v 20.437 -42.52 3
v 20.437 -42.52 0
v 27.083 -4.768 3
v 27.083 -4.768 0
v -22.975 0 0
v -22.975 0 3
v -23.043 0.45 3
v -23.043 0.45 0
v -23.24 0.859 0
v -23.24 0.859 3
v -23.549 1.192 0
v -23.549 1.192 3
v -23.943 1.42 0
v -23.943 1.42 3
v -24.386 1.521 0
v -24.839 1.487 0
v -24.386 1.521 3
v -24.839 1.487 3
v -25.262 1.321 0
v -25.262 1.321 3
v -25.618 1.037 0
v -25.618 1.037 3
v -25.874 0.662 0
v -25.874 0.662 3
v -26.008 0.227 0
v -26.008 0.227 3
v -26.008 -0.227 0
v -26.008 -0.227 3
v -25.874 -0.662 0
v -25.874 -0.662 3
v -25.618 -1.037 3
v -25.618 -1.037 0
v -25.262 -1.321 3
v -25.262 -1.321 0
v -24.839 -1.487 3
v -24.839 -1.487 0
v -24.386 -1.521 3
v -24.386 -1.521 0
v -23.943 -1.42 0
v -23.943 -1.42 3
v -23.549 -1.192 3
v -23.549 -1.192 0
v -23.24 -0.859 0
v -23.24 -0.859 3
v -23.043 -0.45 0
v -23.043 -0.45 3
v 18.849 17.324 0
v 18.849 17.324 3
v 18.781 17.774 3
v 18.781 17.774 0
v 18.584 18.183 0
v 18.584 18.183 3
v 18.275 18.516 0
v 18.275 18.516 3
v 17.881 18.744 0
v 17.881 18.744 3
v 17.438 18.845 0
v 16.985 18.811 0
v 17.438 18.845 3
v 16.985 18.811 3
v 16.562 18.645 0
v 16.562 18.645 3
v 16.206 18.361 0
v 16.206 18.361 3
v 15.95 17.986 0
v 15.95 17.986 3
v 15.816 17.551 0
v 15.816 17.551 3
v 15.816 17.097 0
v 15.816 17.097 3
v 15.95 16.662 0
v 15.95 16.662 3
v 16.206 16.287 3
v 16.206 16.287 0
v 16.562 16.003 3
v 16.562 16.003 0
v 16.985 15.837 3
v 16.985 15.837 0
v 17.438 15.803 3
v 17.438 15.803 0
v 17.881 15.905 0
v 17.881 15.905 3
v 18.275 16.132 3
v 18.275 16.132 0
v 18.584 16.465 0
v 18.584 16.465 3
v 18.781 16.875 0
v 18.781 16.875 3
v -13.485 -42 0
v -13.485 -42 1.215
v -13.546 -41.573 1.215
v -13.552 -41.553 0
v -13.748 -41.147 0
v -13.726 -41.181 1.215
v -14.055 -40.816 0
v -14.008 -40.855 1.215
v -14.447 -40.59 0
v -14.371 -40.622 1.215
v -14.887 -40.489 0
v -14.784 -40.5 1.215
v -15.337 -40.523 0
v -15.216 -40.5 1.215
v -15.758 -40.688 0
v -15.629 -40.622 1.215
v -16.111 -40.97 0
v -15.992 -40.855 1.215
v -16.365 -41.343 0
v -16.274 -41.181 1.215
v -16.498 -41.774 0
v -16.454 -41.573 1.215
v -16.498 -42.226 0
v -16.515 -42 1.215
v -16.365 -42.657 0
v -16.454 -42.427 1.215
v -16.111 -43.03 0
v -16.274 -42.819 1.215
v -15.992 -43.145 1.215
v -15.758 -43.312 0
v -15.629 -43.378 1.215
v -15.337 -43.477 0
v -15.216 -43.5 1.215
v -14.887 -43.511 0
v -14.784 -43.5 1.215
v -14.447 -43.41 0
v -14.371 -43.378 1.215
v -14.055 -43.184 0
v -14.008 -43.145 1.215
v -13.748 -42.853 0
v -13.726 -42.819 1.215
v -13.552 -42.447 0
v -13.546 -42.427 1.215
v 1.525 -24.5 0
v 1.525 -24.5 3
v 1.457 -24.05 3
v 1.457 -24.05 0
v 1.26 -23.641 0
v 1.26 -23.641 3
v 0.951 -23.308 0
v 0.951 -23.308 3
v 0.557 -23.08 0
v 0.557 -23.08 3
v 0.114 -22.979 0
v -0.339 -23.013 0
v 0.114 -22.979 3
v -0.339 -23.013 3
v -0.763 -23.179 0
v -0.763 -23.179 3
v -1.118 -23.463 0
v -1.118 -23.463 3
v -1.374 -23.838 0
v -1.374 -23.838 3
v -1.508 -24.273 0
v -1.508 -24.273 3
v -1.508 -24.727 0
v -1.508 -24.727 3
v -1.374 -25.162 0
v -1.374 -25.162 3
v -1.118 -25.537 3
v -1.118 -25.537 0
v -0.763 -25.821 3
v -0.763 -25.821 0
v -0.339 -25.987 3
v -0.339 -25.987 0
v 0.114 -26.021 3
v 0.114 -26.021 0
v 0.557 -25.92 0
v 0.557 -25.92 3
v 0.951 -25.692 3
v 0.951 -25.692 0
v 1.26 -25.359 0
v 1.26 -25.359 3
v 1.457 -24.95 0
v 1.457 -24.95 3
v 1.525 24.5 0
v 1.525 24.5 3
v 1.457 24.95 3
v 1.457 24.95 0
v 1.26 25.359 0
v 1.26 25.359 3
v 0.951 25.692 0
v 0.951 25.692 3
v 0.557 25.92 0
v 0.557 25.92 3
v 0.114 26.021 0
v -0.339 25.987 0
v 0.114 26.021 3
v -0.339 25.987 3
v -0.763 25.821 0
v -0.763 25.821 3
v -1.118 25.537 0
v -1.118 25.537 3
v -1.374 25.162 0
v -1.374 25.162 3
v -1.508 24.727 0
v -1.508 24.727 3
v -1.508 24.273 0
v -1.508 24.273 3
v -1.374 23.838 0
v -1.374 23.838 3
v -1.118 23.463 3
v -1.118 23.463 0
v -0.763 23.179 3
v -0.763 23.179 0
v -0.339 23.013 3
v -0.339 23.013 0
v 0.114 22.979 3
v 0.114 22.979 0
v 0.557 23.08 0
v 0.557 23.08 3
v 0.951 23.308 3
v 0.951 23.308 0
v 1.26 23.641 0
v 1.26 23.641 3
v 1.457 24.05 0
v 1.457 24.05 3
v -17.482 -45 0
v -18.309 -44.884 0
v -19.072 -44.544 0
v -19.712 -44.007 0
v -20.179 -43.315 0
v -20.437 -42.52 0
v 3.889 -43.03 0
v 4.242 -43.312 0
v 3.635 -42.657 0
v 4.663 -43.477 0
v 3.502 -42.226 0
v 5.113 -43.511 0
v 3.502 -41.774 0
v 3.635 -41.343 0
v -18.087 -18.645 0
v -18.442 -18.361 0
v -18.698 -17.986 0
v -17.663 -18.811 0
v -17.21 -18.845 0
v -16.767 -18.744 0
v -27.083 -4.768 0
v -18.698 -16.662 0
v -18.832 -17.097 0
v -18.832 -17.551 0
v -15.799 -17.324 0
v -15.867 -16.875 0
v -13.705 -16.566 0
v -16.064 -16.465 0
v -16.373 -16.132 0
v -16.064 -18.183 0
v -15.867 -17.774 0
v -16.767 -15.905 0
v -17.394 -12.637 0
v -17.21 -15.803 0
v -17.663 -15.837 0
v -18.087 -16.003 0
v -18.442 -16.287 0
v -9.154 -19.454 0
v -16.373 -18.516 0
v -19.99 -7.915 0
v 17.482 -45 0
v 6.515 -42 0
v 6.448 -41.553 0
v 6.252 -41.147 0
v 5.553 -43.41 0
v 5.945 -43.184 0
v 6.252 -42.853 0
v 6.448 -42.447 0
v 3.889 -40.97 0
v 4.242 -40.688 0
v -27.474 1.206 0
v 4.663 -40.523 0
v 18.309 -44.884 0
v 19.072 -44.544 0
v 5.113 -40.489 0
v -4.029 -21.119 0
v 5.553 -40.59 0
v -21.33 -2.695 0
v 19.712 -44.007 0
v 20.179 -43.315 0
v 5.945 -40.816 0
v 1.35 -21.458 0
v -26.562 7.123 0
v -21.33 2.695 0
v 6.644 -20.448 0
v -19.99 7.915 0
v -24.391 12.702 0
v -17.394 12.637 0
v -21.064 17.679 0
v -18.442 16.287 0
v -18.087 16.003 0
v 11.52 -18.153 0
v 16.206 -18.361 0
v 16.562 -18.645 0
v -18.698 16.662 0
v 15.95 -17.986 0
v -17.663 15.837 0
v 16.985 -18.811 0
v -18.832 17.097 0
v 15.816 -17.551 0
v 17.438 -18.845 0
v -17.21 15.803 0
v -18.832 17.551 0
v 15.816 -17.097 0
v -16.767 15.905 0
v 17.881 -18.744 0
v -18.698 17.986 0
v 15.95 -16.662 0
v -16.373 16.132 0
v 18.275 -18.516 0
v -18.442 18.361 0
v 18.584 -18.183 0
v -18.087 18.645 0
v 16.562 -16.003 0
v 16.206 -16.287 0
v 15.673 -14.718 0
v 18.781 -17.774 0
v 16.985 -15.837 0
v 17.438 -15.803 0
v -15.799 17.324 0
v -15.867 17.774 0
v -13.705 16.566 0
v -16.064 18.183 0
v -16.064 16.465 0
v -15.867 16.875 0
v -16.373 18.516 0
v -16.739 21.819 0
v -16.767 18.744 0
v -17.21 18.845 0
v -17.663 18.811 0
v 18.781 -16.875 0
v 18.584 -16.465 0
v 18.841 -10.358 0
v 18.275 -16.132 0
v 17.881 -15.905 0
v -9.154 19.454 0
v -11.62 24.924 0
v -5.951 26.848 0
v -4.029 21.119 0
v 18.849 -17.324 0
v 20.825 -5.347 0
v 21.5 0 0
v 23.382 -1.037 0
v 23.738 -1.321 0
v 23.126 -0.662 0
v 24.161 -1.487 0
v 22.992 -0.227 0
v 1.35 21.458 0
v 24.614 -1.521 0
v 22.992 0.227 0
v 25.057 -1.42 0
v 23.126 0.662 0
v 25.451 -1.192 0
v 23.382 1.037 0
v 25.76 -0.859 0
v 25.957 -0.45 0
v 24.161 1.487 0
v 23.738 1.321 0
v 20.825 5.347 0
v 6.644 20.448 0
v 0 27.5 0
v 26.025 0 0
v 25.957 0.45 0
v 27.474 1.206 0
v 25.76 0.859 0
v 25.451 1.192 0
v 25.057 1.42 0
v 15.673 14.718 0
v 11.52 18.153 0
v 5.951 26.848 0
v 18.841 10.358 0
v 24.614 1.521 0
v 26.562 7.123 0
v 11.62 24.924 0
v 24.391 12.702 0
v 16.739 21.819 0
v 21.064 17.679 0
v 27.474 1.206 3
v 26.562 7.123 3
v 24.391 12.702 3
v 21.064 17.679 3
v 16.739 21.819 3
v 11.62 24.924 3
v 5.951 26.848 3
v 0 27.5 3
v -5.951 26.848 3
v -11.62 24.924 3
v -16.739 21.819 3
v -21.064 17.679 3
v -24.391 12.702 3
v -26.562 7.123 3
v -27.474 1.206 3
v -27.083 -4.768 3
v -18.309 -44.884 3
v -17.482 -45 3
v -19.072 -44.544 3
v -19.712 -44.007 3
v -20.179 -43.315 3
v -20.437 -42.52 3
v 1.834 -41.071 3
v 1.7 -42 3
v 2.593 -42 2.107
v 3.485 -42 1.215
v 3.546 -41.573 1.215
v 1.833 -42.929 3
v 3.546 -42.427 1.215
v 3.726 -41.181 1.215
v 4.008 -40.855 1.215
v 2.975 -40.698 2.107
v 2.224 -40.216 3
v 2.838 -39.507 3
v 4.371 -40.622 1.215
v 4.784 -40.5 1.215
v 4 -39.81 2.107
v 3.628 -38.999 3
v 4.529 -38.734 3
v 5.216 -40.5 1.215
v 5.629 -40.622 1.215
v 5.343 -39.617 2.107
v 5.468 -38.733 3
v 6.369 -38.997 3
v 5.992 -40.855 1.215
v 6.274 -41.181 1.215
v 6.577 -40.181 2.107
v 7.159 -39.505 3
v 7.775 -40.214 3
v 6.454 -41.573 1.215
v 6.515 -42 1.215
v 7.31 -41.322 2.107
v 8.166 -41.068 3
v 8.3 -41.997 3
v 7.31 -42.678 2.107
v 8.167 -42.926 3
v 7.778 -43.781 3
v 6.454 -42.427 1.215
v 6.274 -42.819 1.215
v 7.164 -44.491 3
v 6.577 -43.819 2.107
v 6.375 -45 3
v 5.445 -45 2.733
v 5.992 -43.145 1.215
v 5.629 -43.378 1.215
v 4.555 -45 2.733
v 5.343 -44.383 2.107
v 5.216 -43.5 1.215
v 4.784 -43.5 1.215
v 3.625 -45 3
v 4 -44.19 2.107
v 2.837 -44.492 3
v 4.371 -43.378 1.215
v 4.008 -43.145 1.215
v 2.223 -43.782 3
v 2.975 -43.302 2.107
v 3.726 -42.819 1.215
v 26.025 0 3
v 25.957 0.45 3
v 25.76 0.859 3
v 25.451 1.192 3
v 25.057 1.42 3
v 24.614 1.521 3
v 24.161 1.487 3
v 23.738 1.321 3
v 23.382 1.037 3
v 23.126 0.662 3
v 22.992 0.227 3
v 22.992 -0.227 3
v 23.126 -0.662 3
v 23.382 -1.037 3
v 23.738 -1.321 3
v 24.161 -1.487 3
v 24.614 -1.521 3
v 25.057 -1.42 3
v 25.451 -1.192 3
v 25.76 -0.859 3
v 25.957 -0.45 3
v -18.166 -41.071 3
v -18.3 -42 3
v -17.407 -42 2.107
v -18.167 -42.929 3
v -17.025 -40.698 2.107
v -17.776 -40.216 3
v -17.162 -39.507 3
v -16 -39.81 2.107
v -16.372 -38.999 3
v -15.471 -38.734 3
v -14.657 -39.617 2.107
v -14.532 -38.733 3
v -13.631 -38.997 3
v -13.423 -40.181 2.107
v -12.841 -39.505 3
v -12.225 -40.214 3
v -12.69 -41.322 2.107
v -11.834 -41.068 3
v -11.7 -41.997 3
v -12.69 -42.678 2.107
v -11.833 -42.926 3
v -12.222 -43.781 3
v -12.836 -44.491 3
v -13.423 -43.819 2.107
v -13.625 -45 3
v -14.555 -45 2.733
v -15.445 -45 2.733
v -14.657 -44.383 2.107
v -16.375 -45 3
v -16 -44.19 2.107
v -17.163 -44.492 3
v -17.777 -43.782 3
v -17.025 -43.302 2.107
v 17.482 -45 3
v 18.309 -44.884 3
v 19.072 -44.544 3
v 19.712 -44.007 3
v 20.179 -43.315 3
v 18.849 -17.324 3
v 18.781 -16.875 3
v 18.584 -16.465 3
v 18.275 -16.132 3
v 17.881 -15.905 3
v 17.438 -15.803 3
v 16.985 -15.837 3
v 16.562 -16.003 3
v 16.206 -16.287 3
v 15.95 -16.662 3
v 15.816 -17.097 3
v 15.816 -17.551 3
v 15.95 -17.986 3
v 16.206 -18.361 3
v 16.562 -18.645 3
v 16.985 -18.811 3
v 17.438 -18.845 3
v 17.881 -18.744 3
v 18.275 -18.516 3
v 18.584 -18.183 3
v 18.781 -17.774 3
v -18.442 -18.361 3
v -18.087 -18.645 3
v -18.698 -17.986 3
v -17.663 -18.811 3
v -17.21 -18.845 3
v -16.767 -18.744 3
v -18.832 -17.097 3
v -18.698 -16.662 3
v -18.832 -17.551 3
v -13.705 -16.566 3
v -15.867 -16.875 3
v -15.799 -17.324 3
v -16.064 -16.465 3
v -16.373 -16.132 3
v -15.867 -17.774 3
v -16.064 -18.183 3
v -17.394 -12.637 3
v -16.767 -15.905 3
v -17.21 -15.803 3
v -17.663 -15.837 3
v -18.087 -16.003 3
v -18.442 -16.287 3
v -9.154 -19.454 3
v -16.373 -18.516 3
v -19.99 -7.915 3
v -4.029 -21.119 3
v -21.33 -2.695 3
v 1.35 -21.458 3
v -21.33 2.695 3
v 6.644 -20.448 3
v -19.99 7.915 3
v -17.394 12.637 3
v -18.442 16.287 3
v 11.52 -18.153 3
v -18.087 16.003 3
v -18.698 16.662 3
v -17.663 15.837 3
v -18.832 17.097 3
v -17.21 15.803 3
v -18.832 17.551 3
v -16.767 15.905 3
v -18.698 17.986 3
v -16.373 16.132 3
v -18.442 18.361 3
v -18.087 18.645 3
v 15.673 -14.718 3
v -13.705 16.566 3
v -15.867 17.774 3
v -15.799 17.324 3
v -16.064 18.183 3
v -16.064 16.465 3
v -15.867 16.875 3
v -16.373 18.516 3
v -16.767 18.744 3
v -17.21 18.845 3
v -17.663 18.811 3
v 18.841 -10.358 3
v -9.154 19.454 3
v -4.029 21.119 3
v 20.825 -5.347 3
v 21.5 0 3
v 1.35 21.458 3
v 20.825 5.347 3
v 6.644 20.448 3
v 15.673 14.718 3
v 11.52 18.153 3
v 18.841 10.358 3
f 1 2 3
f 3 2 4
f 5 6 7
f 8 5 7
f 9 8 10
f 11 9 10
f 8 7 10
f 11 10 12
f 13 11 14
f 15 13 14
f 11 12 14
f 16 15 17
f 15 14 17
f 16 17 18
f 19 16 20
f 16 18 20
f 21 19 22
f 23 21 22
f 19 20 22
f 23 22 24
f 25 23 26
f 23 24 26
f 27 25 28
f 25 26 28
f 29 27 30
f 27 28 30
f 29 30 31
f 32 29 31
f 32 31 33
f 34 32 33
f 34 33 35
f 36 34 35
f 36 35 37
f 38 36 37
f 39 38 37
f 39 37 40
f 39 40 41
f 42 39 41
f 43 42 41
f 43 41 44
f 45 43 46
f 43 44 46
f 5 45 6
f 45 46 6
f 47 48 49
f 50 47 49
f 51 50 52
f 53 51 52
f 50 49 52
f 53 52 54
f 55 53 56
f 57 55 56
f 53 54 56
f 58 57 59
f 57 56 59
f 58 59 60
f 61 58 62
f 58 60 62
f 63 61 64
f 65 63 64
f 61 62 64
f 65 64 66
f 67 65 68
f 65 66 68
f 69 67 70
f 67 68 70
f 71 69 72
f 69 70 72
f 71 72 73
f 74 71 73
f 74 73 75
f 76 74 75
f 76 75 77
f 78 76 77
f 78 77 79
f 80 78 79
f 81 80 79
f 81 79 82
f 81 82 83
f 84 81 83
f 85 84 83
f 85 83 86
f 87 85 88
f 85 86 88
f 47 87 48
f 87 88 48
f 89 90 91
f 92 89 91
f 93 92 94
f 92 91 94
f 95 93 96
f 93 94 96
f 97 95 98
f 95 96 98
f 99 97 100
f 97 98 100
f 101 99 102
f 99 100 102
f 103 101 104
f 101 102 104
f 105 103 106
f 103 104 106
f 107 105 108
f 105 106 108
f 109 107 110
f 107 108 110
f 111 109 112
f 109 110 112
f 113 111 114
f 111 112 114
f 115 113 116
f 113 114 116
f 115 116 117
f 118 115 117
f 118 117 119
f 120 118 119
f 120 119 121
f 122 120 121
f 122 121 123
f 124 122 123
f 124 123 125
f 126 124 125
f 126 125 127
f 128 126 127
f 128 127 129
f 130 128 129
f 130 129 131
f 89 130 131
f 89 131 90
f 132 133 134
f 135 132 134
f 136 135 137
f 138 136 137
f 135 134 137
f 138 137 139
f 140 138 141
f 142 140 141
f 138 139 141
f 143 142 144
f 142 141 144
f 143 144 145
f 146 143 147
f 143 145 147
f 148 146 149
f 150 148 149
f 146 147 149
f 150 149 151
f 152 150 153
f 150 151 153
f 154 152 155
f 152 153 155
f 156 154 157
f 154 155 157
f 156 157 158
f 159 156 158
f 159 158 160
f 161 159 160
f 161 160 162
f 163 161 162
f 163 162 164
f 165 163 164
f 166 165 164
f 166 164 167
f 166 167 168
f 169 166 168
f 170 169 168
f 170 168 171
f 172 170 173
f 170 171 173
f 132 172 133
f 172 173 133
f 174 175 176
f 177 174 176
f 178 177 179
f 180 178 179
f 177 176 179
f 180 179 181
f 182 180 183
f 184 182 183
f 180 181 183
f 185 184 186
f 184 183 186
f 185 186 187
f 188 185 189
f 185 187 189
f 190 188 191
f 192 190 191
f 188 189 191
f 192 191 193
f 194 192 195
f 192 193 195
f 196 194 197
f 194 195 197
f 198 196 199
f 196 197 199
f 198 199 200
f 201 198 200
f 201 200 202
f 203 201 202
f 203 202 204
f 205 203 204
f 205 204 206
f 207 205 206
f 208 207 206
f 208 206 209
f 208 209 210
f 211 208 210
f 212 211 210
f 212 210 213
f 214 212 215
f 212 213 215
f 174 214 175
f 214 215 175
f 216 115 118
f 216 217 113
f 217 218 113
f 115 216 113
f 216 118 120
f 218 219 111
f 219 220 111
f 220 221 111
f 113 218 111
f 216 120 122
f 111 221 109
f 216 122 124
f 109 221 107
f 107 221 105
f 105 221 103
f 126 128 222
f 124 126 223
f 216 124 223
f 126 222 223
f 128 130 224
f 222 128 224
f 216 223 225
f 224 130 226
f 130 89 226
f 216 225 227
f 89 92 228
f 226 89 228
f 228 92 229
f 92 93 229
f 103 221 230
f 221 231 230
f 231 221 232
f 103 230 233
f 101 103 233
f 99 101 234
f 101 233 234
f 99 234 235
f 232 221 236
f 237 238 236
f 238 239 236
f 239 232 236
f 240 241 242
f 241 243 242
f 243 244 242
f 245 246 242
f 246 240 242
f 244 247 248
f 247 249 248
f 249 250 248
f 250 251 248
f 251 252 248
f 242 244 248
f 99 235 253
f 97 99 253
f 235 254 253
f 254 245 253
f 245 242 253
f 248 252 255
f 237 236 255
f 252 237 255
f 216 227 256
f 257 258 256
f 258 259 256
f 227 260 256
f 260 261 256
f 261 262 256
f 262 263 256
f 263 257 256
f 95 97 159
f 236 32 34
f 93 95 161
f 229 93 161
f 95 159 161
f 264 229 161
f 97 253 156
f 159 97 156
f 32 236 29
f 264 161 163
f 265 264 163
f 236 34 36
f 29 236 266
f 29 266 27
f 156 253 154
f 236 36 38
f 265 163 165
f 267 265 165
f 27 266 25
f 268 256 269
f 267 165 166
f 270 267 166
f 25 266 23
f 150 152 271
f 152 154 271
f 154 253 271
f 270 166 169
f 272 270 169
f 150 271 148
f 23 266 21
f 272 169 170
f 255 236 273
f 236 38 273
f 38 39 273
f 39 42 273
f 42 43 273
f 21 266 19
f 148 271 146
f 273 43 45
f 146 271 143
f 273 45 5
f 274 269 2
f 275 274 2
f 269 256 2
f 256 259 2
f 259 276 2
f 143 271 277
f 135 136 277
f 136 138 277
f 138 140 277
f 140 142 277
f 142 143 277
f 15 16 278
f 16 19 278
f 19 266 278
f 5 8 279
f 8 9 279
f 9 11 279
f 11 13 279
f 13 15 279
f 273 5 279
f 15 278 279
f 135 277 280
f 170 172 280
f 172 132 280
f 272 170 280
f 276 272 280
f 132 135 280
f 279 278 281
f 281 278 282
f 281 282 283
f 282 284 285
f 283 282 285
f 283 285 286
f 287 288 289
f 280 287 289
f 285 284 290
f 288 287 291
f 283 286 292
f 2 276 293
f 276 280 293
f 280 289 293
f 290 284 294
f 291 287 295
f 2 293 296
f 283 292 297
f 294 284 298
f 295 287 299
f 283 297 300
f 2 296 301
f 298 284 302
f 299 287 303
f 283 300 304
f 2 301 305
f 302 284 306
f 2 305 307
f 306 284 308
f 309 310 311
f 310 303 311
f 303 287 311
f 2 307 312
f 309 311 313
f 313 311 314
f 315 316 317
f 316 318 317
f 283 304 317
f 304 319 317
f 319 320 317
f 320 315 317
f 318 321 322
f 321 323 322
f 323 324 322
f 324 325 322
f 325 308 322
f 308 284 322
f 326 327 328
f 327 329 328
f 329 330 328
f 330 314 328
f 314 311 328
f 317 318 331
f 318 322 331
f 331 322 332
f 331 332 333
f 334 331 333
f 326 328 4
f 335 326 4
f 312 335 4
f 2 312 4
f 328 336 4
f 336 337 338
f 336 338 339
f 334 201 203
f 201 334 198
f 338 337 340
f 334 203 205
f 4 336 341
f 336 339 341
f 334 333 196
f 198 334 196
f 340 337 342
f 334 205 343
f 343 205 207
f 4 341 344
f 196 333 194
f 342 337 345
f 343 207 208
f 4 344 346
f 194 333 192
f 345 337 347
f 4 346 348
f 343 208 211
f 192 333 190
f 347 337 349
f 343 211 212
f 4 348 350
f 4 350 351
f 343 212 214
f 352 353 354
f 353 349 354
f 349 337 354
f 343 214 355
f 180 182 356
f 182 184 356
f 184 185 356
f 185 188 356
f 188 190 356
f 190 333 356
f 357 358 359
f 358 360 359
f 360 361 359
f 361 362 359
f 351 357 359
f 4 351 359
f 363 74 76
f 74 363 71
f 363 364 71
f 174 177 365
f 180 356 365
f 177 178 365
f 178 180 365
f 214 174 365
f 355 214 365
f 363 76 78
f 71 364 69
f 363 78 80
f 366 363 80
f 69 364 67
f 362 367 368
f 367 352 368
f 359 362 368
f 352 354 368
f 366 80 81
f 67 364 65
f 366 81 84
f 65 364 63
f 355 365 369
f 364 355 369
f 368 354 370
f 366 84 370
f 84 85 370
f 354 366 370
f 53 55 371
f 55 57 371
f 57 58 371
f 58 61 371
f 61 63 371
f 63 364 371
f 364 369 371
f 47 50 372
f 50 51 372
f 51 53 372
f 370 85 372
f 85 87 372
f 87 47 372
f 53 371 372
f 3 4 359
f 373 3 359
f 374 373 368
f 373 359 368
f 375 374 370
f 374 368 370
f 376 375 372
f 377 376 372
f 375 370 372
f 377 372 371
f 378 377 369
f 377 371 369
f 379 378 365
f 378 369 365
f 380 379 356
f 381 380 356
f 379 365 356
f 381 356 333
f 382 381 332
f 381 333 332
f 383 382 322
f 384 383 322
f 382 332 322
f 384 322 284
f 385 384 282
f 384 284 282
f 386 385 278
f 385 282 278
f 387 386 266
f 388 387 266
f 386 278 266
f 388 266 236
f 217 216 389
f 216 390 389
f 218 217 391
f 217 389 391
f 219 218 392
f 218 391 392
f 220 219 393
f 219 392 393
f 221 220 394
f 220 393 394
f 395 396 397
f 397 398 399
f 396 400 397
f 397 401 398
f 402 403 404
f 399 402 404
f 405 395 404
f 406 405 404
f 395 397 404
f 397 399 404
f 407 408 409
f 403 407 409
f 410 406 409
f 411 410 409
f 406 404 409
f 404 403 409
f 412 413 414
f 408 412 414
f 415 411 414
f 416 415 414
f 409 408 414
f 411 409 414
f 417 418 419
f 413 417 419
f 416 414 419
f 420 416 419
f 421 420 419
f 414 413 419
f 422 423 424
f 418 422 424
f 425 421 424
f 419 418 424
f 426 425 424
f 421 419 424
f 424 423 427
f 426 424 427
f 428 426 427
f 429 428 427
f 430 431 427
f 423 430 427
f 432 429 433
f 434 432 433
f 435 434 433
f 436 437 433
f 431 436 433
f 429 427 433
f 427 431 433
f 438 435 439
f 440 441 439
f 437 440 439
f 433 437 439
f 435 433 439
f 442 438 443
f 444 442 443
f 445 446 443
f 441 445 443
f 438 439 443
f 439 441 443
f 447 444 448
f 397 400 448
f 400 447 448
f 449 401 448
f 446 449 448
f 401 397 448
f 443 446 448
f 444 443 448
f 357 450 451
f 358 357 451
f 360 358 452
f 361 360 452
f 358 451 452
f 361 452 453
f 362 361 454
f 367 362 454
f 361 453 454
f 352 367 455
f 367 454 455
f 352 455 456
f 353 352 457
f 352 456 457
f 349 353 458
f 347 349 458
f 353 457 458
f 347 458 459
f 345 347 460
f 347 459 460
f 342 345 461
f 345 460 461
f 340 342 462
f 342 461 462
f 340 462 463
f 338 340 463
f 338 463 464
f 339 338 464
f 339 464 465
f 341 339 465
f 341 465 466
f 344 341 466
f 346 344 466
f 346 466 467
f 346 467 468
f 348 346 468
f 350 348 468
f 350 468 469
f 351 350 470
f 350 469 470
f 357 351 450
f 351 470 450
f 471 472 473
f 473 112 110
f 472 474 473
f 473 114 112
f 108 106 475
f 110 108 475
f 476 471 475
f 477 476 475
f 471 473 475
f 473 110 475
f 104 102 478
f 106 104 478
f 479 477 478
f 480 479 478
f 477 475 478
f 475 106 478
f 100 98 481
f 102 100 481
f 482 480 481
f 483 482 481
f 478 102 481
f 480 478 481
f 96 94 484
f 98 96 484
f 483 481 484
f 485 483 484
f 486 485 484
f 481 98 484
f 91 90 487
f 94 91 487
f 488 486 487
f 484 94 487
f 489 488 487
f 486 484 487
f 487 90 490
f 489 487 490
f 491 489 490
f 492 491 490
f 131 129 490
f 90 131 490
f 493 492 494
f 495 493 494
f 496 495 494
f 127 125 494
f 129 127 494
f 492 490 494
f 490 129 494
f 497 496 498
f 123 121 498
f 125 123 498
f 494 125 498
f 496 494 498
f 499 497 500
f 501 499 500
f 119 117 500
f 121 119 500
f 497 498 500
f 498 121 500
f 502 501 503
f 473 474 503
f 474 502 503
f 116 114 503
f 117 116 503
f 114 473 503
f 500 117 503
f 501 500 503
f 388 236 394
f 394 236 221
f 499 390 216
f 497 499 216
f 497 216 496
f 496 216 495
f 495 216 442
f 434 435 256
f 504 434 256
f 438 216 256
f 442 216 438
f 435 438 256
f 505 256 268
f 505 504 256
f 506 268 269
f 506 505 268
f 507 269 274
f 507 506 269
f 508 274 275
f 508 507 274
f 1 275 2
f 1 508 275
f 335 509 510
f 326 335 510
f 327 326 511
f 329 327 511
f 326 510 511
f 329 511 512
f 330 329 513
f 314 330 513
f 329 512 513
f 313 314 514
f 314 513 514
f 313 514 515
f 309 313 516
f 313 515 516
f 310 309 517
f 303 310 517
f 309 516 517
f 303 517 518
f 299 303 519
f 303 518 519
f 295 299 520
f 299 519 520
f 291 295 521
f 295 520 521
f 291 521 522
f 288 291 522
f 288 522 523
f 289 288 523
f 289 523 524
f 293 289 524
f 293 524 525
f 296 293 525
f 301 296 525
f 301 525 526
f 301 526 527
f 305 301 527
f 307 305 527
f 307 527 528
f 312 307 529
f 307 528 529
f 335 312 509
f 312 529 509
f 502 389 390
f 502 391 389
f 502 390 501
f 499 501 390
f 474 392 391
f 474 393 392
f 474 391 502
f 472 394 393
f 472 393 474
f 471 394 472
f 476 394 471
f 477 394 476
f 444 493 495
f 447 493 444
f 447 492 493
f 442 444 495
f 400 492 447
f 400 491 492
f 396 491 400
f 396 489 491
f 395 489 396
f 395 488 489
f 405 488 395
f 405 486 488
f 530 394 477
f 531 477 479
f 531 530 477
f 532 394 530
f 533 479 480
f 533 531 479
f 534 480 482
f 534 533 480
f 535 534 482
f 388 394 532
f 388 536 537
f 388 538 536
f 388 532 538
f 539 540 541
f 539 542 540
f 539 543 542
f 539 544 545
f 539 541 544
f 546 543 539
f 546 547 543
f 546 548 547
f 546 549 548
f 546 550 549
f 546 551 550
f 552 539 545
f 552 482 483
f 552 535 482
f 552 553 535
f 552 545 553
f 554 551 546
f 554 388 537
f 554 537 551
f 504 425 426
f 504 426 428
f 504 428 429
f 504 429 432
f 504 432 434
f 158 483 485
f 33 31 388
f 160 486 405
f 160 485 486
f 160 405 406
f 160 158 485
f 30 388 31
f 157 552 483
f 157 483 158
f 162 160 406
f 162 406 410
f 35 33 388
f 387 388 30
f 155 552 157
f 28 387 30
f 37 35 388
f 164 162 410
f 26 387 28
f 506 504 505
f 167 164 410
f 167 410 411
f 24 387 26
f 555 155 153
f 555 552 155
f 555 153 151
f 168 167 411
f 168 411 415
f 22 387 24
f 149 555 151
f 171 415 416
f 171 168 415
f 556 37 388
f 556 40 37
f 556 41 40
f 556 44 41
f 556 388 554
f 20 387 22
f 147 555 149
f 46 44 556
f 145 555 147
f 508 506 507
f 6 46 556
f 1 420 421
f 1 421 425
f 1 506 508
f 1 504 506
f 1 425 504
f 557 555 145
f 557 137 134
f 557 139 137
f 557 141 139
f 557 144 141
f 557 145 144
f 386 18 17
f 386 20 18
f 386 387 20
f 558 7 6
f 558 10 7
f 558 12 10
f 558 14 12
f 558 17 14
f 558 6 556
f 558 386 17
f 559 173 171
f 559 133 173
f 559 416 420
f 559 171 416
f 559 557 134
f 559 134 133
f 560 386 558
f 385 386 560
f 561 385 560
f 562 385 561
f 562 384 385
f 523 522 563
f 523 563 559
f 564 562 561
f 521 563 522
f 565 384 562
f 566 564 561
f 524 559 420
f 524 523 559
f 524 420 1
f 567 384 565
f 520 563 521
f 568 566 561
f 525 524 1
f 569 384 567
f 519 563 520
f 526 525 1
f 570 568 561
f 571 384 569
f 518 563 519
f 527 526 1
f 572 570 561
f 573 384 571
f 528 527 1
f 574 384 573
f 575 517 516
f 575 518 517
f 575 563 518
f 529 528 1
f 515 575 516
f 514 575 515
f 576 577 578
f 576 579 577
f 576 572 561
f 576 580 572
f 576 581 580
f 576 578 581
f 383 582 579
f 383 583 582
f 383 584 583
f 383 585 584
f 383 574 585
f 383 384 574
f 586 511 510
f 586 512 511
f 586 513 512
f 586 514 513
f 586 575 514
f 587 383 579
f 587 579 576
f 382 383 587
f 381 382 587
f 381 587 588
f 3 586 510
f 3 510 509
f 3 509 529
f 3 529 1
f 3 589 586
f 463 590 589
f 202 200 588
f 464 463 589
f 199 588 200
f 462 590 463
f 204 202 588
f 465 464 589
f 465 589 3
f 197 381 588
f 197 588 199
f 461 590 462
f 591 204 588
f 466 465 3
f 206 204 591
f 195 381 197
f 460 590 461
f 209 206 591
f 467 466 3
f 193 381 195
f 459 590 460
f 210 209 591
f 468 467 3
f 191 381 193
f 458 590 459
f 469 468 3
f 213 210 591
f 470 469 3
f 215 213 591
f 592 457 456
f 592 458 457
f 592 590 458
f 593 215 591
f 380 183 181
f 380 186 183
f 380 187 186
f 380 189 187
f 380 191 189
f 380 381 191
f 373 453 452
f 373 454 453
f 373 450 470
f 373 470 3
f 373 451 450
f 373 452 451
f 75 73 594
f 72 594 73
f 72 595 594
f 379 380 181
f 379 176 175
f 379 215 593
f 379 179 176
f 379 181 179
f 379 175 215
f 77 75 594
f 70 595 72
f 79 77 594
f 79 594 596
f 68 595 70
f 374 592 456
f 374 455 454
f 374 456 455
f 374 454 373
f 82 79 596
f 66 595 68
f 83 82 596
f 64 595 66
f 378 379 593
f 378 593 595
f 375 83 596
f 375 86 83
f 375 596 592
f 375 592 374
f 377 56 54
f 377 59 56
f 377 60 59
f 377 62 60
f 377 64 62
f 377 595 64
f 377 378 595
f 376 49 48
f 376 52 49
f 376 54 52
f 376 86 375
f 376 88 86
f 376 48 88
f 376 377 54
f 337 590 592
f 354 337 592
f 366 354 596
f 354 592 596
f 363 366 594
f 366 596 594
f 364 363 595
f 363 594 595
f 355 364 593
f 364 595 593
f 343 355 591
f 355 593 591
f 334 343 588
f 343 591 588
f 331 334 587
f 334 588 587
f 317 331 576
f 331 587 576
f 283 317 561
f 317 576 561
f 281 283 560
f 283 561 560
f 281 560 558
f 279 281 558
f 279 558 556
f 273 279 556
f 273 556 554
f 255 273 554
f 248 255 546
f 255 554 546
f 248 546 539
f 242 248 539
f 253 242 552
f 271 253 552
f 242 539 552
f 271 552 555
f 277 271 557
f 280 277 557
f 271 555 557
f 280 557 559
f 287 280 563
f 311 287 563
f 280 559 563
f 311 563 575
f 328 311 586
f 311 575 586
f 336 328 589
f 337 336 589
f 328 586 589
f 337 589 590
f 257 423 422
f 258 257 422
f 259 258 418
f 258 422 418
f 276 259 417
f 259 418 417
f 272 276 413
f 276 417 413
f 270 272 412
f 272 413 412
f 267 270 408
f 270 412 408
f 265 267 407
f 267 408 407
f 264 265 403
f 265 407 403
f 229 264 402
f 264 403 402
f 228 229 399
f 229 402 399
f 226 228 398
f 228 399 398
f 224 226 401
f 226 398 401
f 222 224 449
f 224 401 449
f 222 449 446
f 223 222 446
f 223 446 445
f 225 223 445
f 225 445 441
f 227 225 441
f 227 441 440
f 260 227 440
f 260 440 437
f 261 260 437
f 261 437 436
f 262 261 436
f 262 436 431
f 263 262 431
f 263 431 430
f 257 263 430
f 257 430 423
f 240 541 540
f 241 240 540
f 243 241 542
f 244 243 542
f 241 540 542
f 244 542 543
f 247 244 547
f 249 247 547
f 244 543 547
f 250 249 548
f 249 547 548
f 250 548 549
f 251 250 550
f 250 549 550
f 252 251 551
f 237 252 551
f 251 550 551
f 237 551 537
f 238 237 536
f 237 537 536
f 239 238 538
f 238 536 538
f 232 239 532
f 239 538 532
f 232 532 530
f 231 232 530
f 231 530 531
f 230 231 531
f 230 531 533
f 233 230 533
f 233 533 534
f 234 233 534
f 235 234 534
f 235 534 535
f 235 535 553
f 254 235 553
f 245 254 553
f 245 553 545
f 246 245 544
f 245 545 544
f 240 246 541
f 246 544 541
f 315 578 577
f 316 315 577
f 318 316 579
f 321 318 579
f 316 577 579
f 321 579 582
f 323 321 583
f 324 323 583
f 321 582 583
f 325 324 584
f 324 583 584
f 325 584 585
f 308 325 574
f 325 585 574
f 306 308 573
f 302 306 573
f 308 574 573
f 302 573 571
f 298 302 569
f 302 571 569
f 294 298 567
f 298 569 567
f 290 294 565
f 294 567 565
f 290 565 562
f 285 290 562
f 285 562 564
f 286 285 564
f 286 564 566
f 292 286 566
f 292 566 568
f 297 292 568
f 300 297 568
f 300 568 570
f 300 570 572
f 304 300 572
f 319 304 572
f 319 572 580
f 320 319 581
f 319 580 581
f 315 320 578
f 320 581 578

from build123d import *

# Parameters (mm, degrees)
EXTRUDE_1_DEPTH              = 3
SKETCH_2_R                   = 21.5
CUT_EXTRUDE_1_DEPTH          = 3
SKETCH_3_R                   = 1.525
CUT_EXTRUDE_2_DEPTH          = 3
FILLET_1_R                   = 3
SKETCH_4_R                   = 1.515
CUT_EXTRUDE_3_DEPTH          = 10
HOLE_WIZARD_M3_1_D           = 3
HOLE_WIZARD_M3_1_DEPTH       = 7.25
HOLE_WIZARD_M3_1_CSINK_D     = 6.6
HOLE_WIZARD_M3_1_CSINK_ANGLE = 90
HOLE_WIZARD_M3_1_TIP         = 0.901290929


with BuildPart() as part:
    # 草图1 → 凸台-拉伸1 (new body)
    with BuildSketch(Plane.XY):
        with BuildLine():
            Line((-20, -45), (20, -45))
            Line((20, -45), (27.083419191, -4.76848036))
            ThreePointArc((27.083419191, -4.76848036), (0, 27.5), (-27.083419191, -4.76848036))
            Line((-27.083419191, -4.76848036), (-20, -45))
        make_face()
    extrude(amount=EXTRUDE_1_DEPTH)

    # 草图2 → 切除-拉伸1 (cut)
    with BuildSketch(Plane.XY.offset(3)):
        Circle(SKETCH_2_R)
    extrude(amount=-CUT_EXTRUDE_1_DEPTH, mode=Mode.SUBTRACT)

    # 草图3 → 切除-拉伸2 (cut)
    with BuildSketch(Plane.XY.offset(3)):
        with Locations((17.324116139, 17.324116139)):
            Circle(SKETCH_3_R)
        with Locations((24.5, 0)):
            Circle(SKETCH_3_R)
        with Locations((17.324116139, -17.324116139)):
            Circle(SKETCH_3_R)
        with Locations((0, -24.5)):
            Circle(SKETCH_3_R)
        with Locations((-17.324116139, -17.324116139)):
            Circle(SKETCH_3_R)
        with Locations((-24.5, 0)):
            Circle(SKETCH_3_R)
        with Locations((-17.324116139, 17.324116139)):
            Circle(SKETCH_3_R)
        with Locations((0, 24.5)):
            Circle(SKETCH_3_R)
    extrude(amount=-CUT_EXTRUDE_2_DEPTH, mode=Mode.SUBTRACT)

    # 圆角1
    fillet_1_edges = [part.edges().sort_by_distance(p)[0] for p in [
        (20, -45, 1.5),
        (-20, -45, 1.5),
    ]]
    fillet(fillet_1_edges, radius=FILLET_1_R)

    # 草图4 → 切除-拉伸3 (cut)
    with BuildSketch(Plane.XY.offset(3)):
        with Locations((-15, -42)):
            Circle(SKETCH_4_R)
        with Locations((5, -42)):
            Circle(SKETCH_4_R)
    extrude(amount=-CUT_EXTRUDE_3_DEPTH, mode=Mode.SUBTRACT)

    # M3 十字槽沉头木螺钉的锥形沉头孔1
    with Locations(Plane.XY.offset(3)):
        with Locations((-15, -42), (5, -42)):
            CounterSinkHole(HOLE_WIZARD_M3_1_D / 2, HOLE_WIZARD_M3_1_CSINK_D / 2, depth=HOLE_WIZARD_M3_1_DEPTH, counter_sink_angle=HOLE_WIZARD_M3_1_CSINK_ANGLE)
            with Locations((0, 0, -(HOLE_WIZARD_M3_1_DEPTH + HOLE_WIZARD_M3_1_TIP / 2))):  # 118° drill point
                Cone(0, HOLE_WIZARD_M3_1_D / 2, HOLE_WIZARD_M3_1_TIP, mode=Mode.SUBTRACT)


solid = part.part
